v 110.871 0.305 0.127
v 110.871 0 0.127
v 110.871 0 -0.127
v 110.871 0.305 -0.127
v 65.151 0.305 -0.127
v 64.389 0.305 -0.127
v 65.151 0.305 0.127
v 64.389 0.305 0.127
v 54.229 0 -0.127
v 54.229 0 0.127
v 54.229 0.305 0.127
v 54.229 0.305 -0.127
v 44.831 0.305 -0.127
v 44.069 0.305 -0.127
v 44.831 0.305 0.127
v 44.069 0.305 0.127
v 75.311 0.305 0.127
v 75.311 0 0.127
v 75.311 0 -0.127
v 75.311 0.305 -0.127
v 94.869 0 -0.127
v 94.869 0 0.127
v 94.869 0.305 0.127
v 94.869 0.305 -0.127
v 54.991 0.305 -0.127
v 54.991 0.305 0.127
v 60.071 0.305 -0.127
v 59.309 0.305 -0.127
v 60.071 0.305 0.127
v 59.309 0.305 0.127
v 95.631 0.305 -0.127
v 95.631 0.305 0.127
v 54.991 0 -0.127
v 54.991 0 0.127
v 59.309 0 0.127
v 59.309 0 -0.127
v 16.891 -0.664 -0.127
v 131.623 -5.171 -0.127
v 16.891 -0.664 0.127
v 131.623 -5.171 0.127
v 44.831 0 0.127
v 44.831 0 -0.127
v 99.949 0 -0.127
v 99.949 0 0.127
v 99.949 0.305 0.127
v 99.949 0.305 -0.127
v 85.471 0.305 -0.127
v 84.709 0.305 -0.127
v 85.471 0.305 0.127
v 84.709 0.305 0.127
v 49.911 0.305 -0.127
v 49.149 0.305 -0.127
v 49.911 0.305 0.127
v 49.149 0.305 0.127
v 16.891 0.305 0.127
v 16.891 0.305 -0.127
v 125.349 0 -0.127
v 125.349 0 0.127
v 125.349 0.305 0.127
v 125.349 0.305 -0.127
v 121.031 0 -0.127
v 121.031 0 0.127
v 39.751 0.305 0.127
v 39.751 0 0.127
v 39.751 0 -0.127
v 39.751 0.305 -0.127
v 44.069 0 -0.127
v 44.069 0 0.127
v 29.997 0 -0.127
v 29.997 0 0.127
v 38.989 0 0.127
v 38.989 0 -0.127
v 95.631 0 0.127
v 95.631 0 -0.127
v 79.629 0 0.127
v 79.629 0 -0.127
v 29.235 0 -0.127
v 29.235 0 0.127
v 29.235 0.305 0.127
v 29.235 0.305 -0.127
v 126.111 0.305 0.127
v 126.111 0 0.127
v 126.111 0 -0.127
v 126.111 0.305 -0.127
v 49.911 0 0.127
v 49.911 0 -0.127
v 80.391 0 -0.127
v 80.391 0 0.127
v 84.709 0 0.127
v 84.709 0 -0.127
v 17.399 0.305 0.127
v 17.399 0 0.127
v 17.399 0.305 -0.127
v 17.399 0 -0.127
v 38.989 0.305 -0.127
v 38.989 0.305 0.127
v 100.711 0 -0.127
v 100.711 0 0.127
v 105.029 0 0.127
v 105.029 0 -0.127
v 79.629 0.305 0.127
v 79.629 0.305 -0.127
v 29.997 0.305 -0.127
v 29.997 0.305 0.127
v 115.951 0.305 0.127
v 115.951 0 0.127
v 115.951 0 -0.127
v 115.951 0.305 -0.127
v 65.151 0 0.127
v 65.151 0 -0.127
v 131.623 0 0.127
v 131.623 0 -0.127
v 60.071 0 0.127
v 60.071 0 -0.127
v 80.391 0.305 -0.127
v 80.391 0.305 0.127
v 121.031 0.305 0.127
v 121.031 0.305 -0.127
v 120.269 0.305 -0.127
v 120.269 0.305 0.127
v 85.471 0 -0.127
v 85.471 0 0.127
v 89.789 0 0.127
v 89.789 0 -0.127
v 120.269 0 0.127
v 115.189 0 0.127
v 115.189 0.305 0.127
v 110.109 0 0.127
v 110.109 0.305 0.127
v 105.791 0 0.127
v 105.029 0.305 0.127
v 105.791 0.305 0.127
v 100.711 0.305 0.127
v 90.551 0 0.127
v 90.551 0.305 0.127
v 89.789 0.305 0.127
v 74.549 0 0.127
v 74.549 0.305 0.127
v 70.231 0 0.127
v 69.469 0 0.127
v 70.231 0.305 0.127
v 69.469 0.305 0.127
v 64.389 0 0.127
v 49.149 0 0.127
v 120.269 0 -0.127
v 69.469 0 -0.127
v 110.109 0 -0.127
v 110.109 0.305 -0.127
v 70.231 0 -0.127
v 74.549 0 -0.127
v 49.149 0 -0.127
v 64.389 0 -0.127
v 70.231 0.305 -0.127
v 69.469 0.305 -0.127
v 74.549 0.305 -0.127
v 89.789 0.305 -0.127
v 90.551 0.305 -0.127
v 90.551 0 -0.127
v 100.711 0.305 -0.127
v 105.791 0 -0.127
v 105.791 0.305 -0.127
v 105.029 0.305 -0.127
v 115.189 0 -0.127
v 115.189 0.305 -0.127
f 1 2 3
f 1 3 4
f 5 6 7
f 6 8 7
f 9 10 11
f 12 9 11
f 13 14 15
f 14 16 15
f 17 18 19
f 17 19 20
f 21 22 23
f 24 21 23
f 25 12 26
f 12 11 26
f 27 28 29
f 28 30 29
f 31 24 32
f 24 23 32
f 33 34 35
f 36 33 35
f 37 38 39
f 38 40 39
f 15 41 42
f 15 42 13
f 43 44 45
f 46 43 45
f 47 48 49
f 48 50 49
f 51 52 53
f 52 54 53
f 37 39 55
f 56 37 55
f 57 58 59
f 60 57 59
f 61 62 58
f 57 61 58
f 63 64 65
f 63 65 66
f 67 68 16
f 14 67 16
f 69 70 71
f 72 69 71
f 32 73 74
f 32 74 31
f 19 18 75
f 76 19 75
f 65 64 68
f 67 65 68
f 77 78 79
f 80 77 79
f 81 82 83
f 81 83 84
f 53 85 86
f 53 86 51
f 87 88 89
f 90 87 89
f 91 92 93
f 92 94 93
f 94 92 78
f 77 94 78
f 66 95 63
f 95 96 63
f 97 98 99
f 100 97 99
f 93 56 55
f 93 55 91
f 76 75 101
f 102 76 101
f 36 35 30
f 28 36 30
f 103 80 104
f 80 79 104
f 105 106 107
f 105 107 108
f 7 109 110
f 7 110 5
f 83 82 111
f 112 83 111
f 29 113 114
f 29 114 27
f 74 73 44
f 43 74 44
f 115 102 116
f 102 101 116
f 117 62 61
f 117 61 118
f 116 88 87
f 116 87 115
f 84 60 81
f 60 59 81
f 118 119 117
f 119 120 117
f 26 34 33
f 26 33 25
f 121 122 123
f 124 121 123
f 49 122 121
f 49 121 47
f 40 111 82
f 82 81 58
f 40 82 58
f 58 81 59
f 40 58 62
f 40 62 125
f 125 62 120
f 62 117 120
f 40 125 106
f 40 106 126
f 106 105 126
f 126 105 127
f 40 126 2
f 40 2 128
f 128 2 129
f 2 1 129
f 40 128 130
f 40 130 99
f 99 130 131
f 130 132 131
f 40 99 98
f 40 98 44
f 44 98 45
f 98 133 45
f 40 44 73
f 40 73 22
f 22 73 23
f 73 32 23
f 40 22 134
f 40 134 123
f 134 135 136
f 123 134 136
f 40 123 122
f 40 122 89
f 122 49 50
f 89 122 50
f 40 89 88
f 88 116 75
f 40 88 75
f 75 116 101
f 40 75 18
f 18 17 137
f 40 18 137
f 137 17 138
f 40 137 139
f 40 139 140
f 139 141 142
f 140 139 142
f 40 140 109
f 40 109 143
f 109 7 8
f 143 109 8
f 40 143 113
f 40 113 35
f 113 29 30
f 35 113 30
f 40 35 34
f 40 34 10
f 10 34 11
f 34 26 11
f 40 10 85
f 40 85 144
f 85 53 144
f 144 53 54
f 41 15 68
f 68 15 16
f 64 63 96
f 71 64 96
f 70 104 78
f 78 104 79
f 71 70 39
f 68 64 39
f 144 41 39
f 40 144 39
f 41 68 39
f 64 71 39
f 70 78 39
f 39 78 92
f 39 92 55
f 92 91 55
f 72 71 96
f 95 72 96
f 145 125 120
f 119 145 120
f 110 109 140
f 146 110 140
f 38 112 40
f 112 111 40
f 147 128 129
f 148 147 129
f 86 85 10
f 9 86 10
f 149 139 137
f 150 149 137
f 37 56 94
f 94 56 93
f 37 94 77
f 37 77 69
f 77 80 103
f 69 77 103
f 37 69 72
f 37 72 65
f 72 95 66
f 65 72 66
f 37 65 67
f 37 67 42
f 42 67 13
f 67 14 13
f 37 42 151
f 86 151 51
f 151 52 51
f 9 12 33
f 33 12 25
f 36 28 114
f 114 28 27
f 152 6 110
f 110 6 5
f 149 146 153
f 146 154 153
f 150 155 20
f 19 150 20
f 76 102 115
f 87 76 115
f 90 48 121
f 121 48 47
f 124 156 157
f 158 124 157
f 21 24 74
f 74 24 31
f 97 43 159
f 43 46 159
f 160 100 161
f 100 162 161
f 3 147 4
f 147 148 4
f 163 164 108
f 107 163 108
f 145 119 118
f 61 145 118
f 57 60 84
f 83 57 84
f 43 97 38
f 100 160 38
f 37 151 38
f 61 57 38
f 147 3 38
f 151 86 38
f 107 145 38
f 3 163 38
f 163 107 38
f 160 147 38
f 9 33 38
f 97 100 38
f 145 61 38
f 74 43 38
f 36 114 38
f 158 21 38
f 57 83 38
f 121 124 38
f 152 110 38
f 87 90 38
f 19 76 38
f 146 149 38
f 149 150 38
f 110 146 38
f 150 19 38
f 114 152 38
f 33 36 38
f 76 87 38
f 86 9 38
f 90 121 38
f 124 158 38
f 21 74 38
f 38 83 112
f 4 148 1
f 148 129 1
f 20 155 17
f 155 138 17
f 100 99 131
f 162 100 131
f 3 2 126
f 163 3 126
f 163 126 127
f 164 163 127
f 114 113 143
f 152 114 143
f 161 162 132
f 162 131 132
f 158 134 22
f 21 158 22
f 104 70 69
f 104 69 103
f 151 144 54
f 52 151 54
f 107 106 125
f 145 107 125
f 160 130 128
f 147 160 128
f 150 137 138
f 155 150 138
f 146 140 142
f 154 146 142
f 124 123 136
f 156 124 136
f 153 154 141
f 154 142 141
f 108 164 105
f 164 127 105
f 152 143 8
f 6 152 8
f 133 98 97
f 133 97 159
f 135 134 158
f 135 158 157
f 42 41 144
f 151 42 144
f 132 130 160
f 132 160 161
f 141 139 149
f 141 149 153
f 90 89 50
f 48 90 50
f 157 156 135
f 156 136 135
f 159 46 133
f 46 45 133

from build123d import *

# Parameters (mm, degrees)
EXTRUDE1_DEPTH         = 0.127
SKETCH4_W              = 0.508
SKETCH4_H              = 0.3048
SKETCH4_W_2            = 0.762
SKETCH4_H_2            = 0.508
EB_02_TAB_1_DEPTH      = 0.127
SKETCH2_W              = 0.762
SKETCH2_H              = 0.5588
EB_02_TAB_2_DEPTH      = 0.127
LP_01_TAB_2_X_18_COUNT = 18
LP_01_TAB_2_X_18_PITCH = 5.08


with BuildPart() as part:
    # Sketch1 → Extrude1 (new, symmetric)
    with BuildSketch(Plane.XY):
        Polygon((16.891, 0), (131.6228, 0), (131.6228, -5.171473897), (16.891, -0.663649197), align=None)
    extrude(amount=EXTRUDE1_DEPTH, both=True)

    # Sketch4 → EB-02 Tab 1 (add, symmetric)
    with BuildSketch(Plane.XY):
        with Locations((17.145, 0.1524)):
            Rectangle(SKETCH4_W, SKETCH4_H)
        with Locations((29.6164, 0.0508)):
            Rectangle(SKETCH4_W_2, SKETCH4_H_2)
    extrude(amount=EB_02_TAB_1_DEPTH, both=True)

    # Sketch2 → EB-02 Tab 2 (add, symmetric)
    with BuildSketch(Plane.XY):
        with Locations((39.37, 0.0254)):
            Rectangle(SKETCH2_W, SKETCH2_H)
    eb_02_tab_2 = extrude(amount=EB_02_TAB_2_DEPTH, both=True)

    # LP-01 Tab 2 x 18: EB-02 Tab 2 ×18
    with Locations(*[(i * LP_01_TAB_2_X_18_PITCH, 0, 0) for i in range(1, LP_01_TAB_2_X_18_COUNT)]):
        add(eb_02_tab_2)


solid = part.part
